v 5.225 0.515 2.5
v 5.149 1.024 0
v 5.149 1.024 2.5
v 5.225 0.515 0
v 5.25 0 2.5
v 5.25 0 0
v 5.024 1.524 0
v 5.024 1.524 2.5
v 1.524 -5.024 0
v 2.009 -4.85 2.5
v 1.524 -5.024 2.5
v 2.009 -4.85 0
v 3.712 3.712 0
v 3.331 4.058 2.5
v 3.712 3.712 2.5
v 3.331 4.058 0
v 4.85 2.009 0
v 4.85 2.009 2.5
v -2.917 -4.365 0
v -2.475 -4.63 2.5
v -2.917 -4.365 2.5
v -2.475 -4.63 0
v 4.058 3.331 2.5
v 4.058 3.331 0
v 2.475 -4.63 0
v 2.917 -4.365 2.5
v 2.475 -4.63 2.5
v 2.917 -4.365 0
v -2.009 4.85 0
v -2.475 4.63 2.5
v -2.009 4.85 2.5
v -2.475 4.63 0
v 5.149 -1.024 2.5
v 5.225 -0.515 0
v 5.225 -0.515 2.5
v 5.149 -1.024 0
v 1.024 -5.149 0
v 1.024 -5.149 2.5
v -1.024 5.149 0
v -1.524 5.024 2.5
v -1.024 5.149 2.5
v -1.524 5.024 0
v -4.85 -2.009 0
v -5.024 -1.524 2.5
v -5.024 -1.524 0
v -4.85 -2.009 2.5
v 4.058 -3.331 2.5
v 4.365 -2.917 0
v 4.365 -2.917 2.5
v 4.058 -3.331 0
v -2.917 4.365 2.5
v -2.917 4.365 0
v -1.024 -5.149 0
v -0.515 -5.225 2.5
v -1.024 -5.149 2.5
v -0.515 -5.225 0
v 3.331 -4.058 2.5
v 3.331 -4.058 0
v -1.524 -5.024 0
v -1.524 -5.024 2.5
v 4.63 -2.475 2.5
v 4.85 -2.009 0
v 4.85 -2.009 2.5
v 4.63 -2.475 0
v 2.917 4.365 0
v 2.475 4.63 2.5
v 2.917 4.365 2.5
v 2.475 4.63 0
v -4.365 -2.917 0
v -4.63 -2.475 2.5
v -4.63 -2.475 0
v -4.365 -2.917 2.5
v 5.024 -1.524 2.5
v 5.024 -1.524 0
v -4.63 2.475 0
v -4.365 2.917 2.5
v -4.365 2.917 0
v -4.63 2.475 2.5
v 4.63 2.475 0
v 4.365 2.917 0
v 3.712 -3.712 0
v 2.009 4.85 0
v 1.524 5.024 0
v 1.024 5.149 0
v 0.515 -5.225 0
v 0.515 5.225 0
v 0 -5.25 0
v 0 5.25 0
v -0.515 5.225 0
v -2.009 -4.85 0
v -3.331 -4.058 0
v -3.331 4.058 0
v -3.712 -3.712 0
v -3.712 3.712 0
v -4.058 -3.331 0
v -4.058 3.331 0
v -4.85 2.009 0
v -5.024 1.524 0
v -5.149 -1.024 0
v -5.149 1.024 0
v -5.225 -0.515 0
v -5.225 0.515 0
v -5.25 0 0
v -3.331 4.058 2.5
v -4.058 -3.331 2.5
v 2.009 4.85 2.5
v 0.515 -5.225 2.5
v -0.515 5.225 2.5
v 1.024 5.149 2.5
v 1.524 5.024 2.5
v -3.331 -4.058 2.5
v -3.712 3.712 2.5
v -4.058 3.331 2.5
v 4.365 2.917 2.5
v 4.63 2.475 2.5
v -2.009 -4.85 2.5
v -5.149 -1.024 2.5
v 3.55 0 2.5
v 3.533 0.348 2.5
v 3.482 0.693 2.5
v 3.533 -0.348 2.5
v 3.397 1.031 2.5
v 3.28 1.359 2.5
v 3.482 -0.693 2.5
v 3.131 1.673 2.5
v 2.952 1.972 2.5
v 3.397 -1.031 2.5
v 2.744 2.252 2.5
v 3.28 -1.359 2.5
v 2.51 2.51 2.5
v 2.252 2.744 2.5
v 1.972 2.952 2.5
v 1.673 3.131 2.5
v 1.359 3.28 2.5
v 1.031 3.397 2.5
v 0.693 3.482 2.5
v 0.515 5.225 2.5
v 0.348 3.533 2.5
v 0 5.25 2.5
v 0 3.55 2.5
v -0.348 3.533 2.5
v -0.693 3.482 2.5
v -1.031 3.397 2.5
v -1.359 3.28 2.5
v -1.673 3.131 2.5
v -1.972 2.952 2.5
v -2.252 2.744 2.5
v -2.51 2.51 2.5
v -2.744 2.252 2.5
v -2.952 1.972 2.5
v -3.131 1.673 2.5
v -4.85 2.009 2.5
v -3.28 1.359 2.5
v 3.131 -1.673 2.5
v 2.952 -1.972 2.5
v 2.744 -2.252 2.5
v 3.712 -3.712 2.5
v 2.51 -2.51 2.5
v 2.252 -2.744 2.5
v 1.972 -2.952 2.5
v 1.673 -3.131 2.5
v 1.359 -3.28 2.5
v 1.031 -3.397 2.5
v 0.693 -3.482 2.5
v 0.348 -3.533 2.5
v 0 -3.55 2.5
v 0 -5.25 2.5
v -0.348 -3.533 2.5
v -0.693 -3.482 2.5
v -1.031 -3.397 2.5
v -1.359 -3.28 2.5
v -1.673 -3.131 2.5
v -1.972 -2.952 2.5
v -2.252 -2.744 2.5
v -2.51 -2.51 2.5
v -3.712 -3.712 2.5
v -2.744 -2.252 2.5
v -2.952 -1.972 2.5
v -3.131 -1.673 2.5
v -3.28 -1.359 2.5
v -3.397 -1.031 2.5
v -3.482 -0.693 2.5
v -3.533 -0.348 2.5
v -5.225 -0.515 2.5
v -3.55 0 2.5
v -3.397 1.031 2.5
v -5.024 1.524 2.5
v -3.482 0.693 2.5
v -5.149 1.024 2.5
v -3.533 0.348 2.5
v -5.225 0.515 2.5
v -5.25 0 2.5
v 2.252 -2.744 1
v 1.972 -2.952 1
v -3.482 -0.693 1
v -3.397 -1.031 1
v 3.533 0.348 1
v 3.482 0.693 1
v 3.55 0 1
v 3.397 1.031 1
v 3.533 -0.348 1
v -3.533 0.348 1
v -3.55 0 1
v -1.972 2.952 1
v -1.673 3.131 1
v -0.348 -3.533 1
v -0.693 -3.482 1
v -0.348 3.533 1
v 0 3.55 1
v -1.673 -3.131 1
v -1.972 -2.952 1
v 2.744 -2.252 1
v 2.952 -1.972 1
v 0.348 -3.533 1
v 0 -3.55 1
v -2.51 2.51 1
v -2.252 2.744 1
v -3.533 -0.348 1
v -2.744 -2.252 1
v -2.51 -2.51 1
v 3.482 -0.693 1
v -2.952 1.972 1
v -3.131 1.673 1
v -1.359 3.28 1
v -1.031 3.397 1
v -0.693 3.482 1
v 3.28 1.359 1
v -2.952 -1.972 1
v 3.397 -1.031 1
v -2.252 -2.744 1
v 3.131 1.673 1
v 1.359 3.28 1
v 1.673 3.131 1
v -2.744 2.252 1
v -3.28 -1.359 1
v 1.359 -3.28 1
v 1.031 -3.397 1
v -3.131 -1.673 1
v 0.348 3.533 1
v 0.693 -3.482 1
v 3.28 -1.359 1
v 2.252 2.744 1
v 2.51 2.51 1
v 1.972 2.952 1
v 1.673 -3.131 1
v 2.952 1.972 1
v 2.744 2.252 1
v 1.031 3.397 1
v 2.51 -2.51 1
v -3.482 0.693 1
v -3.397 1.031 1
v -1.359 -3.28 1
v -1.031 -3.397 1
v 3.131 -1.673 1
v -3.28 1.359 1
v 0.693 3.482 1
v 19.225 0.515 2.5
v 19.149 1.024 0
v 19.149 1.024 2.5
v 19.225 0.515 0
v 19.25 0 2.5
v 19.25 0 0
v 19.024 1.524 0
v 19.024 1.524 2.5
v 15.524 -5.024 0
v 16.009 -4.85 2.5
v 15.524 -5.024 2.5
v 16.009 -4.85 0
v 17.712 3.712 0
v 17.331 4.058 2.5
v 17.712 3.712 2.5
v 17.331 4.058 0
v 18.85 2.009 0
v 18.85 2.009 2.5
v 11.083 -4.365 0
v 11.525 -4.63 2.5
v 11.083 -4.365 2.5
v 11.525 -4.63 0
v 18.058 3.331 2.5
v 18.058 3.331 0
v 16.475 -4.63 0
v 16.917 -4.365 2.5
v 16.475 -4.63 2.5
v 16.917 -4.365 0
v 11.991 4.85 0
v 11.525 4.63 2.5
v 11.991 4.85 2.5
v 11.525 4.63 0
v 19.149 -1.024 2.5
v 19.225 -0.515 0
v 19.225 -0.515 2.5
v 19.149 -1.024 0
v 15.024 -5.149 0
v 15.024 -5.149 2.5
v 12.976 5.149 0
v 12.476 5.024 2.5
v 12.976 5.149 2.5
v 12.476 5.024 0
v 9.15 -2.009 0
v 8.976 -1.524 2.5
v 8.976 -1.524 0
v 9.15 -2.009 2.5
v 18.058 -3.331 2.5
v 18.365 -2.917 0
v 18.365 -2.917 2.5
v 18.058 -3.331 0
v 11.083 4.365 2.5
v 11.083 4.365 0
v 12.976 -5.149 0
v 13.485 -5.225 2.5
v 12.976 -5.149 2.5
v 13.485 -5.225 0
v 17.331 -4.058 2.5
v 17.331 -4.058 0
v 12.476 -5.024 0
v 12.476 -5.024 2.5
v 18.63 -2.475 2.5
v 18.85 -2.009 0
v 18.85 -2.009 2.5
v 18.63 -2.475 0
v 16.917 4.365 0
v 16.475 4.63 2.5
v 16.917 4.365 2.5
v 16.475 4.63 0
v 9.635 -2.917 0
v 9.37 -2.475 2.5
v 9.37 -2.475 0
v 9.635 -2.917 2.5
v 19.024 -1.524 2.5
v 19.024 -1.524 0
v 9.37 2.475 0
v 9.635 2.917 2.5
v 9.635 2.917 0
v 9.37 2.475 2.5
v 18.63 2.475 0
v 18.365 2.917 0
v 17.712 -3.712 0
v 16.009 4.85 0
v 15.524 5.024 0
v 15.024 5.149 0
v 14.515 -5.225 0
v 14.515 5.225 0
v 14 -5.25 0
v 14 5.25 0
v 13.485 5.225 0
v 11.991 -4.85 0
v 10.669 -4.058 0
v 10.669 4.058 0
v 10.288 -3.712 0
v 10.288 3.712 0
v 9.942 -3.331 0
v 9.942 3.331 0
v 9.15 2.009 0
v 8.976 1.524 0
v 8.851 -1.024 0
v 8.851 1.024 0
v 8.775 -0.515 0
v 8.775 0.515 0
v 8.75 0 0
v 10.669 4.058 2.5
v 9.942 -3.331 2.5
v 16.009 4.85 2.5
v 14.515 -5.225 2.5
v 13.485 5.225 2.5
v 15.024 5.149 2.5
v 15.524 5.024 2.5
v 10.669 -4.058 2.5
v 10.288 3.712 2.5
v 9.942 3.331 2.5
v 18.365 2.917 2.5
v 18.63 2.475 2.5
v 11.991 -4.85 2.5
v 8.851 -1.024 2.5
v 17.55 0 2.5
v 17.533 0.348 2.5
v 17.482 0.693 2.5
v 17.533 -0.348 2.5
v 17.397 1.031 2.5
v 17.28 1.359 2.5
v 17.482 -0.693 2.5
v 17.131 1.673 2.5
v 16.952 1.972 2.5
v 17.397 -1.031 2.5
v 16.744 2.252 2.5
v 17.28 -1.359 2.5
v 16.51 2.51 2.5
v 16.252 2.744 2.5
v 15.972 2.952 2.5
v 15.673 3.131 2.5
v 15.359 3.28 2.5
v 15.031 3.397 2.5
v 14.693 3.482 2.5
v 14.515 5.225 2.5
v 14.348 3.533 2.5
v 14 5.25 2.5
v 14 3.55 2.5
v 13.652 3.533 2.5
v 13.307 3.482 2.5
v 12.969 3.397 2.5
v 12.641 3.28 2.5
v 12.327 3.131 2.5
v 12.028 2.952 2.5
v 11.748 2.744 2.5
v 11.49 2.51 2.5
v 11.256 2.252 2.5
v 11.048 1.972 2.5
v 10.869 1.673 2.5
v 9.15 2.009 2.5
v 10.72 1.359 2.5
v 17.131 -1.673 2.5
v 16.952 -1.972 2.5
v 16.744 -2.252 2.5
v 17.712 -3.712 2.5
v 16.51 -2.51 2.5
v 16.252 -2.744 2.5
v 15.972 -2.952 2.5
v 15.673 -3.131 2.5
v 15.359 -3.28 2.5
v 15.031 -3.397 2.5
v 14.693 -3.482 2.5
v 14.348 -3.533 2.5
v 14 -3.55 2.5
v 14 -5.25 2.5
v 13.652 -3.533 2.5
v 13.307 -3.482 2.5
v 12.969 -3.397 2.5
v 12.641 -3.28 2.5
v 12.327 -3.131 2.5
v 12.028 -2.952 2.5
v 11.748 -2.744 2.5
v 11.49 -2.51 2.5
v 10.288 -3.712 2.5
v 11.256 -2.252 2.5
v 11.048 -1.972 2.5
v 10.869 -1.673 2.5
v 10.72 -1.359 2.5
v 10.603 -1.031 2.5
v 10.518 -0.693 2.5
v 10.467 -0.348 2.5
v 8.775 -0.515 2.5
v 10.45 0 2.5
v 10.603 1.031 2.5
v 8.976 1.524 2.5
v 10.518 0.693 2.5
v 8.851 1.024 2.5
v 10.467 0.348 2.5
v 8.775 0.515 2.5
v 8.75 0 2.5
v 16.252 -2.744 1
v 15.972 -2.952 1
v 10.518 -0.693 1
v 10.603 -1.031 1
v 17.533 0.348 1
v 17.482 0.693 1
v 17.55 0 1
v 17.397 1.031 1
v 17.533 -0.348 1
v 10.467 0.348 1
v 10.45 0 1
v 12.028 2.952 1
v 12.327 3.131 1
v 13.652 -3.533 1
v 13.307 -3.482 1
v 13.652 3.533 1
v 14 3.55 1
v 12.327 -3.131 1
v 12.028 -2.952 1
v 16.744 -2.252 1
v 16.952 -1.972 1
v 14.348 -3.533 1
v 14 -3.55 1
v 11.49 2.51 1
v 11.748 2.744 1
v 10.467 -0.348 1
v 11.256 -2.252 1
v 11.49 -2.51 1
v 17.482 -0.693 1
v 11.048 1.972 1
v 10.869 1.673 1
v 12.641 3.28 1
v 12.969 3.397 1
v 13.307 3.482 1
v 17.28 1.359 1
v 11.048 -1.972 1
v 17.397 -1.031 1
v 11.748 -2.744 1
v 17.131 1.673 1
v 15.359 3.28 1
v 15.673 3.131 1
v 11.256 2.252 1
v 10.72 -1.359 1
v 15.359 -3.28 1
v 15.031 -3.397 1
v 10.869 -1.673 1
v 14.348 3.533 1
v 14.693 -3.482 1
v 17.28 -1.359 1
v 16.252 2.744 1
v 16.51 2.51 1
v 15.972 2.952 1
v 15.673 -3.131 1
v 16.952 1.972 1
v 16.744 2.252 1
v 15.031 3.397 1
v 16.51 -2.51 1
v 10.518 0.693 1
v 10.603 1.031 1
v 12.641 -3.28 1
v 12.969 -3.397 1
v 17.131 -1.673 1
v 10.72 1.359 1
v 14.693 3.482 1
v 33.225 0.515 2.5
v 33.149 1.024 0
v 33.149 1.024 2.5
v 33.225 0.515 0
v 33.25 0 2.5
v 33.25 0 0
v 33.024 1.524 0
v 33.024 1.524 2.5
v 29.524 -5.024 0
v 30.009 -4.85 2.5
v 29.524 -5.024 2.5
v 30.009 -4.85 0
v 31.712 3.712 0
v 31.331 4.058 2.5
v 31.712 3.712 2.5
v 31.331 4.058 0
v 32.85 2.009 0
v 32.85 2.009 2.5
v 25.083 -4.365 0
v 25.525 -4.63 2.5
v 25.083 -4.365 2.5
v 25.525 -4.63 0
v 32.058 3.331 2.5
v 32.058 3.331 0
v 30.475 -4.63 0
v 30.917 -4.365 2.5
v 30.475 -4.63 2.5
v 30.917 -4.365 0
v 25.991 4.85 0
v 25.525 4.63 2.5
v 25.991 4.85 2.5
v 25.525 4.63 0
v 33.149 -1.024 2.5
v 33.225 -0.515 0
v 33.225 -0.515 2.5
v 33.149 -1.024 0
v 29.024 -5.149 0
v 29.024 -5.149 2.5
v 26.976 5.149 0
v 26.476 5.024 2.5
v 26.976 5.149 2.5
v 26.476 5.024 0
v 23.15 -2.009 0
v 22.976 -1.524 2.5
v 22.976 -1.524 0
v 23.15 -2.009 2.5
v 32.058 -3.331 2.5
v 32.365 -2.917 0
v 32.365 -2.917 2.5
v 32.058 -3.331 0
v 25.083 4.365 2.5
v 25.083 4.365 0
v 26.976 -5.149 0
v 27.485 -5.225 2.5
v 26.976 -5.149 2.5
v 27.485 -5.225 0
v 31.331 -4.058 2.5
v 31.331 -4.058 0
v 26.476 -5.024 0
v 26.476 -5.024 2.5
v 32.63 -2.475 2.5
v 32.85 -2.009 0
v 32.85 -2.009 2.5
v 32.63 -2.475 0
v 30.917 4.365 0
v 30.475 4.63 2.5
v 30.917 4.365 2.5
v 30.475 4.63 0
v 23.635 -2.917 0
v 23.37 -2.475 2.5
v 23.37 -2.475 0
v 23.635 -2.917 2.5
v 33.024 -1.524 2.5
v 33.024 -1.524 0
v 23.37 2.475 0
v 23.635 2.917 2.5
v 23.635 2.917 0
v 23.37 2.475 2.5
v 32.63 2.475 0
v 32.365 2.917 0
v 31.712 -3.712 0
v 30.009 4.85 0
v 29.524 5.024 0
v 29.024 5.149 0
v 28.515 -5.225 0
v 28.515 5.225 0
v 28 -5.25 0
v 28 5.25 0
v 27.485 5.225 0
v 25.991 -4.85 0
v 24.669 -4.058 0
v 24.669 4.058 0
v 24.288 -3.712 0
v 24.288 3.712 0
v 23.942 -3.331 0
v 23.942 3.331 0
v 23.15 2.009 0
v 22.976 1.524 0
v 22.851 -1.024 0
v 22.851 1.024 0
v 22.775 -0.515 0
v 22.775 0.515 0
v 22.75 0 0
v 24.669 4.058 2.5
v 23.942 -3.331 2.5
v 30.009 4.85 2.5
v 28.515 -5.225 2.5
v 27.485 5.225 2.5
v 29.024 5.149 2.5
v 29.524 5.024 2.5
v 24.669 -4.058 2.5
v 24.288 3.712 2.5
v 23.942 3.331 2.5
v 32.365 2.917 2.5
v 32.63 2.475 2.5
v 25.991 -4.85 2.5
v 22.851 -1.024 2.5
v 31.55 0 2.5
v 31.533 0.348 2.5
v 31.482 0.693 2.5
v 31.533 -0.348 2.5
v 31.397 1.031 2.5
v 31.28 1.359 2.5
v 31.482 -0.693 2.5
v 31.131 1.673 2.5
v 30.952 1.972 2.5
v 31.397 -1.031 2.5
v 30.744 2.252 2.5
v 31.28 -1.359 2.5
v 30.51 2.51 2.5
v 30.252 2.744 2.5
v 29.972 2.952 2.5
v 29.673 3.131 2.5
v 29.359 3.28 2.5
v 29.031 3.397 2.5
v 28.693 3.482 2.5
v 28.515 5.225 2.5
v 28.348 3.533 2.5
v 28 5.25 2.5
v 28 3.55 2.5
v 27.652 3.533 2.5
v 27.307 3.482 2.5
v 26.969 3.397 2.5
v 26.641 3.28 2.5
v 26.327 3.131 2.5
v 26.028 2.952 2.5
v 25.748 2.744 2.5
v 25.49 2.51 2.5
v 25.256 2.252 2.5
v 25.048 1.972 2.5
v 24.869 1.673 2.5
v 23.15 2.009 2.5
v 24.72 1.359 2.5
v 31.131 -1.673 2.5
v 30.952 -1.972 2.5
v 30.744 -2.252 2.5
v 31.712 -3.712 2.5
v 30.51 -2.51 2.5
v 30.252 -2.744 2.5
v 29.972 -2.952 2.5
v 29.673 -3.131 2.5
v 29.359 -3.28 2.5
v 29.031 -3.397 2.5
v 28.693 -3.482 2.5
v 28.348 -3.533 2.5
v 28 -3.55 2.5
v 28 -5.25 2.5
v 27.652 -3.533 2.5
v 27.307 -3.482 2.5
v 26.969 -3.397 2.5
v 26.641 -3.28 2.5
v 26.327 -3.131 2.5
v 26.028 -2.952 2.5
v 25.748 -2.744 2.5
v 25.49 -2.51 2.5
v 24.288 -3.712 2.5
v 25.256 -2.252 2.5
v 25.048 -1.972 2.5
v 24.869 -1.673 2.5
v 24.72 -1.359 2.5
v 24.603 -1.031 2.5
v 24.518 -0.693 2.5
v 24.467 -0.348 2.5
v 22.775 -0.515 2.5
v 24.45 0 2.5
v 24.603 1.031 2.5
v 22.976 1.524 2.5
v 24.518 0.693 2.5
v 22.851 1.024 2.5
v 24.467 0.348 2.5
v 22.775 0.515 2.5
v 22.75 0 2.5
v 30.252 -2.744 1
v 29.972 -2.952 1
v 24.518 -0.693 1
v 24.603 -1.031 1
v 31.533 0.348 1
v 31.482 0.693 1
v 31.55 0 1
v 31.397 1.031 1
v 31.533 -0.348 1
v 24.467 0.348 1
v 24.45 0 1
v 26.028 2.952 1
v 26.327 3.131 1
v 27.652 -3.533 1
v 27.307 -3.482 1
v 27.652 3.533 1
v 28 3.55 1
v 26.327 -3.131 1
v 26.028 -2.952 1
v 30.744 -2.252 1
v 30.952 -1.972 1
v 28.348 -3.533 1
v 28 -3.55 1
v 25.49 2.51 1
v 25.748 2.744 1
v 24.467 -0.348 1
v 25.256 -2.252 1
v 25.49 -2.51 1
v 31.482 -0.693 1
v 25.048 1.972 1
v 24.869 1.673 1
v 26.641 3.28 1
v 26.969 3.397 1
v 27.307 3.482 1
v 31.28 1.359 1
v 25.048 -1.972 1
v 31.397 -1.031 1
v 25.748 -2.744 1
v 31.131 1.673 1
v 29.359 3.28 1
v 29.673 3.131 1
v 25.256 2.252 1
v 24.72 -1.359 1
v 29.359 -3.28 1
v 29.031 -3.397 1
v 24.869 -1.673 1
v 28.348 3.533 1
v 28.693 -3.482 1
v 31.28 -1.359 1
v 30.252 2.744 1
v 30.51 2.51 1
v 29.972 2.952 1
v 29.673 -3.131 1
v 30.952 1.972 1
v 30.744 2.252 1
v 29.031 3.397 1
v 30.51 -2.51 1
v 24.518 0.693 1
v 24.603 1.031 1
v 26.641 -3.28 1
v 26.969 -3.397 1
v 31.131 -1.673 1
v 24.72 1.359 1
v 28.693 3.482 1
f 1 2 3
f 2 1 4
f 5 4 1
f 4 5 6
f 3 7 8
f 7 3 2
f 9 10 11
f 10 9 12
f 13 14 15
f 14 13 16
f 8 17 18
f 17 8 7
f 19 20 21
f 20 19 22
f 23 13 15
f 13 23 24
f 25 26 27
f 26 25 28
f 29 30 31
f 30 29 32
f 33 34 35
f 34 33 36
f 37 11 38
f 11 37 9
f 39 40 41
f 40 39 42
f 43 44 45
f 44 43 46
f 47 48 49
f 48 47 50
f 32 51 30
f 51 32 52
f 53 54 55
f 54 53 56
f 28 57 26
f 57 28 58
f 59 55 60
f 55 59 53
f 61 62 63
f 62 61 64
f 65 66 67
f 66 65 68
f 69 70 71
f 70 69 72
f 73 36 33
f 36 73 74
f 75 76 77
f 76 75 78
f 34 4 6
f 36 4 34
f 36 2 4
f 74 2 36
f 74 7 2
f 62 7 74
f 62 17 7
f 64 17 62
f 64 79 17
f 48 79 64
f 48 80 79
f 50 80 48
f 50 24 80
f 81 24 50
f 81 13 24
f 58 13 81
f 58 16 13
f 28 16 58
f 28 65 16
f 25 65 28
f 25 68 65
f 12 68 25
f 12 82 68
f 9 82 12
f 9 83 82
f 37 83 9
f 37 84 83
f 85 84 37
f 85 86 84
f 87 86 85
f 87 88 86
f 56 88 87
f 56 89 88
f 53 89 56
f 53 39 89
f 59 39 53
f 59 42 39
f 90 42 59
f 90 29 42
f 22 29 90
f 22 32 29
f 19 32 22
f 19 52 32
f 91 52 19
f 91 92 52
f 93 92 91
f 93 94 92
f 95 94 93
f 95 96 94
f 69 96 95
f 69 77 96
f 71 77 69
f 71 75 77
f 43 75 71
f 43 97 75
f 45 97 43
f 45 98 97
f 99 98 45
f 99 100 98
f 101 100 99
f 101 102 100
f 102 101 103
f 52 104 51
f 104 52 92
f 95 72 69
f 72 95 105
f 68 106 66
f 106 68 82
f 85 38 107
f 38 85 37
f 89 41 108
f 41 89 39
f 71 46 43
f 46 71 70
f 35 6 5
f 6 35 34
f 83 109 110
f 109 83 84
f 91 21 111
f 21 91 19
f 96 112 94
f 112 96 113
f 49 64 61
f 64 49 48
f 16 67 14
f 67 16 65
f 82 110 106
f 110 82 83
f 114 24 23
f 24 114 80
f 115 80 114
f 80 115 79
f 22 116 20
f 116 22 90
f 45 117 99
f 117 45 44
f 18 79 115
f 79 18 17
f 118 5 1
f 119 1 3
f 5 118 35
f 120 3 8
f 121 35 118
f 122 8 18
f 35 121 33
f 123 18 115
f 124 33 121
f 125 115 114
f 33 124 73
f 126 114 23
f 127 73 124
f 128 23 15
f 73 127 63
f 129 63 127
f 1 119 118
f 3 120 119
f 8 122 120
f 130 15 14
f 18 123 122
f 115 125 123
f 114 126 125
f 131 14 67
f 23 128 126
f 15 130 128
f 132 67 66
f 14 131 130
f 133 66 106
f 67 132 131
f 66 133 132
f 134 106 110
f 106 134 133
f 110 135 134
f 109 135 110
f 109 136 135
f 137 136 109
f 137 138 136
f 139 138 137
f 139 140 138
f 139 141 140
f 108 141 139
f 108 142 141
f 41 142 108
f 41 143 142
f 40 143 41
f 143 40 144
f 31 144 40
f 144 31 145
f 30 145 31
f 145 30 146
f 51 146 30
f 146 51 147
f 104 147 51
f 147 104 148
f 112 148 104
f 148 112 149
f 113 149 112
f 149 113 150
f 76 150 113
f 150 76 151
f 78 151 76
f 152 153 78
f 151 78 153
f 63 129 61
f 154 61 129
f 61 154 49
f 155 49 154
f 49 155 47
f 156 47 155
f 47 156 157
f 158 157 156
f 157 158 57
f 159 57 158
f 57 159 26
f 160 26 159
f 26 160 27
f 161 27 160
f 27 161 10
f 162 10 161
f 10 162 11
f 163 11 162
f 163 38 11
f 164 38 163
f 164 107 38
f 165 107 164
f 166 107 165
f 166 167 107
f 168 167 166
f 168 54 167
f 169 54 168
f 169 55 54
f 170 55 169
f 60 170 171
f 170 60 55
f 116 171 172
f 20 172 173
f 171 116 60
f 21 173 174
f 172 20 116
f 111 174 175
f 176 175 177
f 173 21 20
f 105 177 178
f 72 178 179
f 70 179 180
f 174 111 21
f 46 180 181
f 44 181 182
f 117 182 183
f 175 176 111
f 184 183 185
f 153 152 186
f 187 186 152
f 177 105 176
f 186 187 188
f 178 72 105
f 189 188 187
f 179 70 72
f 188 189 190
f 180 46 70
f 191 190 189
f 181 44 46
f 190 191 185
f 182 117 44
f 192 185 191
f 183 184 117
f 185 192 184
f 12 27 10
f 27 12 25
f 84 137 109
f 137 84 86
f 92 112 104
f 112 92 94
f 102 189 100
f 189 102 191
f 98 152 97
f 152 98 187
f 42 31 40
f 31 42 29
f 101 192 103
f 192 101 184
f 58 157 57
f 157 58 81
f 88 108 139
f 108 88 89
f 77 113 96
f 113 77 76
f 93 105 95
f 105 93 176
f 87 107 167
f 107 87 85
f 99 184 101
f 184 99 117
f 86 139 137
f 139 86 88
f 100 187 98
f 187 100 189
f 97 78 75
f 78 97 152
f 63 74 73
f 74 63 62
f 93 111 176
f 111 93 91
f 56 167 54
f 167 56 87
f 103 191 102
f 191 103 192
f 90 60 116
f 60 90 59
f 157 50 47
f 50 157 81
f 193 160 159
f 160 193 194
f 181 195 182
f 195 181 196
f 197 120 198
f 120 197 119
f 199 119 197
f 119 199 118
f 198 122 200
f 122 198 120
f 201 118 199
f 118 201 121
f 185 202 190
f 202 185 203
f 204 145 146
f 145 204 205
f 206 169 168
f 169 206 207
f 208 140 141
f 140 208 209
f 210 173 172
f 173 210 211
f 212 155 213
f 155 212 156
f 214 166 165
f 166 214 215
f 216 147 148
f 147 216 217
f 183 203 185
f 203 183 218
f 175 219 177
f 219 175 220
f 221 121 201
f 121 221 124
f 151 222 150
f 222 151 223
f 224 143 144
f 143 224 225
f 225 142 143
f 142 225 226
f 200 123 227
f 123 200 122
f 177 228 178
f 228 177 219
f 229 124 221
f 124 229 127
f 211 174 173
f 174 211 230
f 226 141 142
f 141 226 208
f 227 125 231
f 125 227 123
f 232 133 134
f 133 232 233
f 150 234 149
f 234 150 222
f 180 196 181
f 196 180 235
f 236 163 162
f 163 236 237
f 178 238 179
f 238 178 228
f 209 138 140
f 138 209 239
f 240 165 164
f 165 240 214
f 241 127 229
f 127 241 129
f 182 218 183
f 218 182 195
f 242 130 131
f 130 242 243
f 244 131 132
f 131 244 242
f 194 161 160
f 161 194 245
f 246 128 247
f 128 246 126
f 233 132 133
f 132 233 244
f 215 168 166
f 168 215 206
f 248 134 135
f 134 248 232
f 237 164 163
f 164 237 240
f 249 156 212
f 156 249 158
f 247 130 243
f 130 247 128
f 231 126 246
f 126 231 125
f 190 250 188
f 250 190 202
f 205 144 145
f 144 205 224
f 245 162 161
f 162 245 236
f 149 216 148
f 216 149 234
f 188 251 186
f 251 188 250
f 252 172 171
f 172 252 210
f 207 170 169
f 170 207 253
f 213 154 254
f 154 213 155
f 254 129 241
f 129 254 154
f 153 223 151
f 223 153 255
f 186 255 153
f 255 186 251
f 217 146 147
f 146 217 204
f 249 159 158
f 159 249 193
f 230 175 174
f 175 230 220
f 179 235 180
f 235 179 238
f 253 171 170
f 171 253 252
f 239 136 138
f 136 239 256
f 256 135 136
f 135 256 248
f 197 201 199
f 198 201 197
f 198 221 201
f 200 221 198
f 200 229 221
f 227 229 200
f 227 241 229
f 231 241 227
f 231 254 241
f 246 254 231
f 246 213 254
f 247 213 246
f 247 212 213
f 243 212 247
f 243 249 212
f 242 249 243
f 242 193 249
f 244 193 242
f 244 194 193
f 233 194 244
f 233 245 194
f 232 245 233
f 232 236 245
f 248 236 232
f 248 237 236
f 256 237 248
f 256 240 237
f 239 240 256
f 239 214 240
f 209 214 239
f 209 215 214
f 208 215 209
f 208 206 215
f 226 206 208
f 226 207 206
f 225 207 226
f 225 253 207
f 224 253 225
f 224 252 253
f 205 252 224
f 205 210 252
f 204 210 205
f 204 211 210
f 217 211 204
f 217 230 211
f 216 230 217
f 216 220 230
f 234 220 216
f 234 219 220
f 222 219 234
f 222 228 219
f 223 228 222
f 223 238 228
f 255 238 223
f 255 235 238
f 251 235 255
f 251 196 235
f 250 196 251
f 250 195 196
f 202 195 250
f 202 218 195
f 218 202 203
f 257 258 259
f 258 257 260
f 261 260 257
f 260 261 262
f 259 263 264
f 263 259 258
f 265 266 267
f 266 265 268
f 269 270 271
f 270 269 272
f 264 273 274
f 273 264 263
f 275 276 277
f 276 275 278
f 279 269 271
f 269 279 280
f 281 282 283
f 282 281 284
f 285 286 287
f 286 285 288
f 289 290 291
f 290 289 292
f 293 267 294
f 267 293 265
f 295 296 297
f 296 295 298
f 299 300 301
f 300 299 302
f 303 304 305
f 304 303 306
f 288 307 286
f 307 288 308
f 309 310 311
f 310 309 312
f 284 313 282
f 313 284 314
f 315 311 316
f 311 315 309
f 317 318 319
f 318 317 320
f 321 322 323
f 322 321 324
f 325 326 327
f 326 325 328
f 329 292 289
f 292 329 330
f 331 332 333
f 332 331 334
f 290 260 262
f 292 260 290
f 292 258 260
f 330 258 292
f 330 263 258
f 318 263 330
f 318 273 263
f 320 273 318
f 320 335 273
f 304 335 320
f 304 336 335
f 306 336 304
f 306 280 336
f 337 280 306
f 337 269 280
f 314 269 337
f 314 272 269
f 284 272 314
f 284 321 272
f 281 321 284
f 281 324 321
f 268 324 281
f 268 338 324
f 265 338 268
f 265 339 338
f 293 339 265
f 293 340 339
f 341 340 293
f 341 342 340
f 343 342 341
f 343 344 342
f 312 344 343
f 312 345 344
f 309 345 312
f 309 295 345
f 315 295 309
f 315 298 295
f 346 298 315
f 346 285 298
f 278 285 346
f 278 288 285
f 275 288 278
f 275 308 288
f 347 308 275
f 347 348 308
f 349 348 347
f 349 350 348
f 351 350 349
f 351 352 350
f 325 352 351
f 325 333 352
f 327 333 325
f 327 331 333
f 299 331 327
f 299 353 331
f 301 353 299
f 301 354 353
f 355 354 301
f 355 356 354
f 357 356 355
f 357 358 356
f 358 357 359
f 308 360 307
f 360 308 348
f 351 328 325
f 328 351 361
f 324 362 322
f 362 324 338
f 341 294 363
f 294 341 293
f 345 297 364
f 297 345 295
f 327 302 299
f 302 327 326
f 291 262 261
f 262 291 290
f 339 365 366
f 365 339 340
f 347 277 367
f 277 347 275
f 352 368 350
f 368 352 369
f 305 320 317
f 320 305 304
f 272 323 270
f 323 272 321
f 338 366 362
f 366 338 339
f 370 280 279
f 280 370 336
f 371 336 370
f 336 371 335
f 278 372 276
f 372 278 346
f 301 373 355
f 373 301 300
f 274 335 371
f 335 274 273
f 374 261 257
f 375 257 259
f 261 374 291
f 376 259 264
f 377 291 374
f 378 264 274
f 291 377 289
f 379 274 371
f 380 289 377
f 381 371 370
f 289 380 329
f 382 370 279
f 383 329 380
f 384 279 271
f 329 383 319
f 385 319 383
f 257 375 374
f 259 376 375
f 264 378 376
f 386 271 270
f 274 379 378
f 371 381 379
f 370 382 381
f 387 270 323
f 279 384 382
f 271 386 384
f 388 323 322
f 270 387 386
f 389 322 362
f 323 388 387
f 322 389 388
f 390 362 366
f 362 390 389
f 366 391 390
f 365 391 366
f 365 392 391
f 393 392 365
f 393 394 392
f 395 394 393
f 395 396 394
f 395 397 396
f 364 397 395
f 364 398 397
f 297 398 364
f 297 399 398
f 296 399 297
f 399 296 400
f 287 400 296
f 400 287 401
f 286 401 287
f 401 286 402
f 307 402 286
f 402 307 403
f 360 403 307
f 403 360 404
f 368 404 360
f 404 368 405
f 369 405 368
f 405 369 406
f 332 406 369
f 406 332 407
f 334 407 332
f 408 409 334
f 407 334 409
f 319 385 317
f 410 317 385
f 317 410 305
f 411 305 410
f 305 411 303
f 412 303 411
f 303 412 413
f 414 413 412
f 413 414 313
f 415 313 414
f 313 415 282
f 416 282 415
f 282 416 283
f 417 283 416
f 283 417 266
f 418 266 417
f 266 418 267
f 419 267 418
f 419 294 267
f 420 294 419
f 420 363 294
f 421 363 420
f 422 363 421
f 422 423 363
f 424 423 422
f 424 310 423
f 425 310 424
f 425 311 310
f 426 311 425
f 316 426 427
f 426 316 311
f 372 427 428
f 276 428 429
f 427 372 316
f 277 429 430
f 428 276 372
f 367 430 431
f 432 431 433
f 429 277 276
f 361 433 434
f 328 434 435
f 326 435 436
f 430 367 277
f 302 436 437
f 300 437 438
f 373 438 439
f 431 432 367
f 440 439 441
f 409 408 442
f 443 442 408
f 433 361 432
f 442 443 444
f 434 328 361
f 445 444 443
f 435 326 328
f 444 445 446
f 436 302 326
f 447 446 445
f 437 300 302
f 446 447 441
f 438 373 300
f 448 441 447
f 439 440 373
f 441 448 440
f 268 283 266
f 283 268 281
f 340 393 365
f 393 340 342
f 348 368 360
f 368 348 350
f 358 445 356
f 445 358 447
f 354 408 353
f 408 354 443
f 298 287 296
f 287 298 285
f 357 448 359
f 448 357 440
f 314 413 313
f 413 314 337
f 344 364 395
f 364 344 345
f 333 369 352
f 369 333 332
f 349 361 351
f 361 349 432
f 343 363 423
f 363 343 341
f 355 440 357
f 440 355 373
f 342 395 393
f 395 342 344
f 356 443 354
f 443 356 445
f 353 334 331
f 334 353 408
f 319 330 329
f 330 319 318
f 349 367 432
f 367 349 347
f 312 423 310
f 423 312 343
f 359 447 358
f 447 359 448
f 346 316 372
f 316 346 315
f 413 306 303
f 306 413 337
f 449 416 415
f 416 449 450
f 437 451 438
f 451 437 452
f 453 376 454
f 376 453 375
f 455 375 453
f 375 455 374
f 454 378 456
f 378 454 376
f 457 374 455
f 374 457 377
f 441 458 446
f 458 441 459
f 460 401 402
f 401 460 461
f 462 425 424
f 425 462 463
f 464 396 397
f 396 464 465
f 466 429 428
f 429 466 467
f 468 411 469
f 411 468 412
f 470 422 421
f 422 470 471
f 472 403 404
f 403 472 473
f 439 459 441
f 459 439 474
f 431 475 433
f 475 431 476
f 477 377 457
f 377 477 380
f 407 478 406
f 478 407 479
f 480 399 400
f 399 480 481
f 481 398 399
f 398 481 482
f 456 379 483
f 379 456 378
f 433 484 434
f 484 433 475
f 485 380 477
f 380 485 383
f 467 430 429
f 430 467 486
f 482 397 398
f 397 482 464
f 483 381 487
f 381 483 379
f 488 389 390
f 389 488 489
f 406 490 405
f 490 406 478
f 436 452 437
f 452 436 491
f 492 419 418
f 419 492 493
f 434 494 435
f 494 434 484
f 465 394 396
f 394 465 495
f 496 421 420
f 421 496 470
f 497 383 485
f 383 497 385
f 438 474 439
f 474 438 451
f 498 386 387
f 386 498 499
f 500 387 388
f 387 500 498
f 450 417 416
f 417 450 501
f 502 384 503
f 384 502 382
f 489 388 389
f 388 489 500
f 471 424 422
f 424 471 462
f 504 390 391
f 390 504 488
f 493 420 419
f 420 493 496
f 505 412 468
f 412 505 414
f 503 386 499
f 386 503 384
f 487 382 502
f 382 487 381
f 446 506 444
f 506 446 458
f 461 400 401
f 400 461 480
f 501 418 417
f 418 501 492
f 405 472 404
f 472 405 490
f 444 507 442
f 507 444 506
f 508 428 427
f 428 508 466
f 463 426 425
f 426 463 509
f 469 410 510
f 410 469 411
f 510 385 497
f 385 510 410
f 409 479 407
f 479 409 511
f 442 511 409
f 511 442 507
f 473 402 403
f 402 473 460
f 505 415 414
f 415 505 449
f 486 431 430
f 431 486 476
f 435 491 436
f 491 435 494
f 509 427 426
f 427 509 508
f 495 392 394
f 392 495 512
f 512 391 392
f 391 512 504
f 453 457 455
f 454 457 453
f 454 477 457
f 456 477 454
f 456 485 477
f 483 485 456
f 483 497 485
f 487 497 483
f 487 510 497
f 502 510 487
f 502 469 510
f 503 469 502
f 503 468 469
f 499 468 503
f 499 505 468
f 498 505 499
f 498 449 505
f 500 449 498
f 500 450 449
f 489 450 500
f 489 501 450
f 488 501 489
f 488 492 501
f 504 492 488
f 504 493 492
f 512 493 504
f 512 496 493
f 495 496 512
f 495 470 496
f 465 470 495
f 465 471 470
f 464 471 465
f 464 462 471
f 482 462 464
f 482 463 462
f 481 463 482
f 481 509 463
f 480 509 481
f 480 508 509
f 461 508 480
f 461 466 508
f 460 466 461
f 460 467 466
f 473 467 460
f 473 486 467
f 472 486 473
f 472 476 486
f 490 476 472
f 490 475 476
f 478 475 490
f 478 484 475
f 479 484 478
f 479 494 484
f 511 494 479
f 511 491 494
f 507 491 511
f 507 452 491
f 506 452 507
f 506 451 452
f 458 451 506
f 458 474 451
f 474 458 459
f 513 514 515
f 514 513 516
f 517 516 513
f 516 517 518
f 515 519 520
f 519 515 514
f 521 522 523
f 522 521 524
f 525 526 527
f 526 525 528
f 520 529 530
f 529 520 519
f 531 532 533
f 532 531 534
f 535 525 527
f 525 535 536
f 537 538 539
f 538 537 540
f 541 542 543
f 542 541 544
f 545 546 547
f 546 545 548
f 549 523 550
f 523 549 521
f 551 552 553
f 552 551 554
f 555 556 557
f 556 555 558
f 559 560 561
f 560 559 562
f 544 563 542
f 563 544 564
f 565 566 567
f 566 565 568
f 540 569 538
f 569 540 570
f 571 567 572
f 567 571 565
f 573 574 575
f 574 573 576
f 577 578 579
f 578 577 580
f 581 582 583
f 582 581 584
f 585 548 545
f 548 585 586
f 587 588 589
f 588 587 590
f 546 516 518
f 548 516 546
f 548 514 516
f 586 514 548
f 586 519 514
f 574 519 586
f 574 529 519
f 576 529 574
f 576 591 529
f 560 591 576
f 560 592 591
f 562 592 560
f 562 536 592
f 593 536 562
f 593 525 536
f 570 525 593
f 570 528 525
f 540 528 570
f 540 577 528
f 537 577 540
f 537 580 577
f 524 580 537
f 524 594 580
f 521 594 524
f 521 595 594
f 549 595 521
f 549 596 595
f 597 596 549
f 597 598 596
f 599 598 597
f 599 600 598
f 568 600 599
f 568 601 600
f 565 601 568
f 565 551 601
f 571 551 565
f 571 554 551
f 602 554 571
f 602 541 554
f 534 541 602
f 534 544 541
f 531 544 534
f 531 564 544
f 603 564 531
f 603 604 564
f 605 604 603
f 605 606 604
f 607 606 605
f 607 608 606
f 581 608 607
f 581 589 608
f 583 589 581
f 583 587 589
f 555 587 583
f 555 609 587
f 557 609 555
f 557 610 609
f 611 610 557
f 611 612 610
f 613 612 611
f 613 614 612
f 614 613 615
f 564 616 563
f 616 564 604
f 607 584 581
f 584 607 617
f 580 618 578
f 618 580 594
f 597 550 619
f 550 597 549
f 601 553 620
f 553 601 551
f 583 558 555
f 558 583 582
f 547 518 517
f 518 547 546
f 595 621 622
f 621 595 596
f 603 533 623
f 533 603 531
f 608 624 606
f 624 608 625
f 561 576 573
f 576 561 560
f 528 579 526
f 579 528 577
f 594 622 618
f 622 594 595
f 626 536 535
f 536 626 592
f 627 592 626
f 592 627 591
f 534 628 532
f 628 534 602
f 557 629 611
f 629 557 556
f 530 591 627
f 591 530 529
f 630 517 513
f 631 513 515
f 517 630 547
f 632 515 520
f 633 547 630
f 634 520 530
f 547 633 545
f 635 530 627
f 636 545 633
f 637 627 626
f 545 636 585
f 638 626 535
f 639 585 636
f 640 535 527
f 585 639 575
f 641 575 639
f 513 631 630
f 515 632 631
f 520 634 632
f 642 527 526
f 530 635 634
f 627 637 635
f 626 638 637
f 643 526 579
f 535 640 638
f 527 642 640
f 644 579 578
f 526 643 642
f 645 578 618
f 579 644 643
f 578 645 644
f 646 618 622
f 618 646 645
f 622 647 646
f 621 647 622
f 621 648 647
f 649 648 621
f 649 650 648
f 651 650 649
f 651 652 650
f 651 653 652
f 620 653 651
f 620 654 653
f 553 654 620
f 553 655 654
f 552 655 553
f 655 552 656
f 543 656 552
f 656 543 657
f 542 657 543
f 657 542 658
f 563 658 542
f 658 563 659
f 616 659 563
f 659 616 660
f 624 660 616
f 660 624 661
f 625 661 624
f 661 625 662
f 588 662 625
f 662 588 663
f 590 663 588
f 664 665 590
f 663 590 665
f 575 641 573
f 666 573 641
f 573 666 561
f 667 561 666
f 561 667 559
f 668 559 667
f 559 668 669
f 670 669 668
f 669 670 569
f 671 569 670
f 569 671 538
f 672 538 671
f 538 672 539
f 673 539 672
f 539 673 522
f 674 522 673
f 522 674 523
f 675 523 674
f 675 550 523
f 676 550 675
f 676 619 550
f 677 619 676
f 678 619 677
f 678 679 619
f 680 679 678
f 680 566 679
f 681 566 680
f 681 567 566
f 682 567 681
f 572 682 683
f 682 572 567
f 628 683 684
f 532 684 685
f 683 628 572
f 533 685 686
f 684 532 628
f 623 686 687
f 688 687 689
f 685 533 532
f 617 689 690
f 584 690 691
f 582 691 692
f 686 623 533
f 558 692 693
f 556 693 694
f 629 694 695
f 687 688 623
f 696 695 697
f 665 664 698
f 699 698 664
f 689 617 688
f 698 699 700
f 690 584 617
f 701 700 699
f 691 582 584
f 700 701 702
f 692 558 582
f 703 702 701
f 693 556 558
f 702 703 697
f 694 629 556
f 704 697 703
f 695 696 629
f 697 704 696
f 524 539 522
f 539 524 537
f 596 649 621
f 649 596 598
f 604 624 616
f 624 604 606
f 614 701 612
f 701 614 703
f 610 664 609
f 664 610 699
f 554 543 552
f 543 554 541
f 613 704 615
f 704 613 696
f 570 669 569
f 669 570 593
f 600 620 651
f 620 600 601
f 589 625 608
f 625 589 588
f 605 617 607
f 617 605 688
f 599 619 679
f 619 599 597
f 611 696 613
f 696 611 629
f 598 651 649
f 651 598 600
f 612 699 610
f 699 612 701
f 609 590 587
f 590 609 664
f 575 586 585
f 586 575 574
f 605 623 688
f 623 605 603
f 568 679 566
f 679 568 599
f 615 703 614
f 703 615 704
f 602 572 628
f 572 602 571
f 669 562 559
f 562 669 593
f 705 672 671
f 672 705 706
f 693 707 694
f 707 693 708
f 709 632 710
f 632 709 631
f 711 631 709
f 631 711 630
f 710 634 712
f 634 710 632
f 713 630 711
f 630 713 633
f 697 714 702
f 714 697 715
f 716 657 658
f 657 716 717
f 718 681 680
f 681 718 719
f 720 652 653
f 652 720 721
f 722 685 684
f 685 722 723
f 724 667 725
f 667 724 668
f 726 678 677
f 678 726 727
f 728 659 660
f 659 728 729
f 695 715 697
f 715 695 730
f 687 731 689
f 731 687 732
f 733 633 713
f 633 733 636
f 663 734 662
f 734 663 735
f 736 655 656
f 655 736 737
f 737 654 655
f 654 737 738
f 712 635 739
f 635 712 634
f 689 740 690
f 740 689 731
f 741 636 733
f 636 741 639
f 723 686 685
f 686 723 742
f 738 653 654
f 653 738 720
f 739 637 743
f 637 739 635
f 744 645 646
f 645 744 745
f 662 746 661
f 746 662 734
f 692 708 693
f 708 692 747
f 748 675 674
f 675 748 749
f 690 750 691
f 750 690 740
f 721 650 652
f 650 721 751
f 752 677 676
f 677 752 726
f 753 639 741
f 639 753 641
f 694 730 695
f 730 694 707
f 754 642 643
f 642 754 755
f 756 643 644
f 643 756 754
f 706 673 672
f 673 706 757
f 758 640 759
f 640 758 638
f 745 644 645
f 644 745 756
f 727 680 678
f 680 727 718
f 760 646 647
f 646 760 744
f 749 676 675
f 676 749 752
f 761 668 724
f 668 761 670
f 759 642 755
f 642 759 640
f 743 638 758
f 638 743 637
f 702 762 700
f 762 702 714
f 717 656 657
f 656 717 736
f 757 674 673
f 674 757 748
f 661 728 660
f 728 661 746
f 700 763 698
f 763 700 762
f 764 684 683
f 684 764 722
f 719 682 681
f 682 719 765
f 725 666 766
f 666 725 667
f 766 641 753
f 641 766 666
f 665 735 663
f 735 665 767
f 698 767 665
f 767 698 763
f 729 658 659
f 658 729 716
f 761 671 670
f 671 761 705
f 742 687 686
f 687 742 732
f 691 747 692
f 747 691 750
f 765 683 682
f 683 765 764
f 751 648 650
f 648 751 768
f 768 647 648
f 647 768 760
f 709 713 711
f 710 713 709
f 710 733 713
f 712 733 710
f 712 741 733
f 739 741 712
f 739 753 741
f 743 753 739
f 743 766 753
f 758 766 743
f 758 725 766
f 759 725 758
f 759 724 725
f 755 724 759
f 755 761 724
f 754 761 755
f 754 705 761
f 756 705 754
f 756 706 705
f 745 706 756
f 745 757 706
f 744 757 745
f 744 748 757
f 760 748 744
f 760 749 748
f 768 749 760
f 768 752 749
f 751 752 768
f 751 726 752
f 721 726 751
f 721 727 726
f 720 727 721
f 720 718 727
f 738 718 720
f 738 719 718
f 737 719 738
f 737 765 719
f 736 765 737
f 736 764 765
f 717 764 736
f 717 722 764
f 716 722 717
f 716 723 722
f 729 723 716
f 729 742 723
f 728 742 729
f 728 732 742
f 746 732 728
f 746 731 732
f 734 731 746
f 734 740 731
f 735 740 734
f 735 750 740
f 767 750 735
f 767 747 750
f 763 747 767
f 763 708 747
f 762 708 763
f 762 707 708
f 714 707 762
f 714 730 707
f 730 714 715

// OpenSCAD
// ═══════════════════════════════════════════════════════
//  POS Terminal — Button Retainer Disc
//
//  Slides onto the post tip of each button cap from inside
//  the case. Glue it in place with superglue.
//
//  Why it works:
//    disc (10.5mm) > button hole (7.0mm)
//    → cap can no longer be pulled outward through the face
//    → also adds 2.5mm extra reach toward the tactile switch
//
//  Print: 3×  (all three are on the plate below)
//  Orientation: flat face DOWN, socket opening facing UP
//  No supports needed.
//  Colour: same as caps, or black — it's hidden inside anyway
// ═══════════════════════════════════════════════════════

$fn = 64;

module retainer_disc() {
    difference() {
        cylinder(d=10.5, h=2.5);
        translate([0, 0, 1.0])
            cylinder(d=7.1, h=1.6);
    }
}

retainer_disc();
translate([14, 0, 0]) retainer_disc();
translate([28, 0, 0]) retainer_disc();
